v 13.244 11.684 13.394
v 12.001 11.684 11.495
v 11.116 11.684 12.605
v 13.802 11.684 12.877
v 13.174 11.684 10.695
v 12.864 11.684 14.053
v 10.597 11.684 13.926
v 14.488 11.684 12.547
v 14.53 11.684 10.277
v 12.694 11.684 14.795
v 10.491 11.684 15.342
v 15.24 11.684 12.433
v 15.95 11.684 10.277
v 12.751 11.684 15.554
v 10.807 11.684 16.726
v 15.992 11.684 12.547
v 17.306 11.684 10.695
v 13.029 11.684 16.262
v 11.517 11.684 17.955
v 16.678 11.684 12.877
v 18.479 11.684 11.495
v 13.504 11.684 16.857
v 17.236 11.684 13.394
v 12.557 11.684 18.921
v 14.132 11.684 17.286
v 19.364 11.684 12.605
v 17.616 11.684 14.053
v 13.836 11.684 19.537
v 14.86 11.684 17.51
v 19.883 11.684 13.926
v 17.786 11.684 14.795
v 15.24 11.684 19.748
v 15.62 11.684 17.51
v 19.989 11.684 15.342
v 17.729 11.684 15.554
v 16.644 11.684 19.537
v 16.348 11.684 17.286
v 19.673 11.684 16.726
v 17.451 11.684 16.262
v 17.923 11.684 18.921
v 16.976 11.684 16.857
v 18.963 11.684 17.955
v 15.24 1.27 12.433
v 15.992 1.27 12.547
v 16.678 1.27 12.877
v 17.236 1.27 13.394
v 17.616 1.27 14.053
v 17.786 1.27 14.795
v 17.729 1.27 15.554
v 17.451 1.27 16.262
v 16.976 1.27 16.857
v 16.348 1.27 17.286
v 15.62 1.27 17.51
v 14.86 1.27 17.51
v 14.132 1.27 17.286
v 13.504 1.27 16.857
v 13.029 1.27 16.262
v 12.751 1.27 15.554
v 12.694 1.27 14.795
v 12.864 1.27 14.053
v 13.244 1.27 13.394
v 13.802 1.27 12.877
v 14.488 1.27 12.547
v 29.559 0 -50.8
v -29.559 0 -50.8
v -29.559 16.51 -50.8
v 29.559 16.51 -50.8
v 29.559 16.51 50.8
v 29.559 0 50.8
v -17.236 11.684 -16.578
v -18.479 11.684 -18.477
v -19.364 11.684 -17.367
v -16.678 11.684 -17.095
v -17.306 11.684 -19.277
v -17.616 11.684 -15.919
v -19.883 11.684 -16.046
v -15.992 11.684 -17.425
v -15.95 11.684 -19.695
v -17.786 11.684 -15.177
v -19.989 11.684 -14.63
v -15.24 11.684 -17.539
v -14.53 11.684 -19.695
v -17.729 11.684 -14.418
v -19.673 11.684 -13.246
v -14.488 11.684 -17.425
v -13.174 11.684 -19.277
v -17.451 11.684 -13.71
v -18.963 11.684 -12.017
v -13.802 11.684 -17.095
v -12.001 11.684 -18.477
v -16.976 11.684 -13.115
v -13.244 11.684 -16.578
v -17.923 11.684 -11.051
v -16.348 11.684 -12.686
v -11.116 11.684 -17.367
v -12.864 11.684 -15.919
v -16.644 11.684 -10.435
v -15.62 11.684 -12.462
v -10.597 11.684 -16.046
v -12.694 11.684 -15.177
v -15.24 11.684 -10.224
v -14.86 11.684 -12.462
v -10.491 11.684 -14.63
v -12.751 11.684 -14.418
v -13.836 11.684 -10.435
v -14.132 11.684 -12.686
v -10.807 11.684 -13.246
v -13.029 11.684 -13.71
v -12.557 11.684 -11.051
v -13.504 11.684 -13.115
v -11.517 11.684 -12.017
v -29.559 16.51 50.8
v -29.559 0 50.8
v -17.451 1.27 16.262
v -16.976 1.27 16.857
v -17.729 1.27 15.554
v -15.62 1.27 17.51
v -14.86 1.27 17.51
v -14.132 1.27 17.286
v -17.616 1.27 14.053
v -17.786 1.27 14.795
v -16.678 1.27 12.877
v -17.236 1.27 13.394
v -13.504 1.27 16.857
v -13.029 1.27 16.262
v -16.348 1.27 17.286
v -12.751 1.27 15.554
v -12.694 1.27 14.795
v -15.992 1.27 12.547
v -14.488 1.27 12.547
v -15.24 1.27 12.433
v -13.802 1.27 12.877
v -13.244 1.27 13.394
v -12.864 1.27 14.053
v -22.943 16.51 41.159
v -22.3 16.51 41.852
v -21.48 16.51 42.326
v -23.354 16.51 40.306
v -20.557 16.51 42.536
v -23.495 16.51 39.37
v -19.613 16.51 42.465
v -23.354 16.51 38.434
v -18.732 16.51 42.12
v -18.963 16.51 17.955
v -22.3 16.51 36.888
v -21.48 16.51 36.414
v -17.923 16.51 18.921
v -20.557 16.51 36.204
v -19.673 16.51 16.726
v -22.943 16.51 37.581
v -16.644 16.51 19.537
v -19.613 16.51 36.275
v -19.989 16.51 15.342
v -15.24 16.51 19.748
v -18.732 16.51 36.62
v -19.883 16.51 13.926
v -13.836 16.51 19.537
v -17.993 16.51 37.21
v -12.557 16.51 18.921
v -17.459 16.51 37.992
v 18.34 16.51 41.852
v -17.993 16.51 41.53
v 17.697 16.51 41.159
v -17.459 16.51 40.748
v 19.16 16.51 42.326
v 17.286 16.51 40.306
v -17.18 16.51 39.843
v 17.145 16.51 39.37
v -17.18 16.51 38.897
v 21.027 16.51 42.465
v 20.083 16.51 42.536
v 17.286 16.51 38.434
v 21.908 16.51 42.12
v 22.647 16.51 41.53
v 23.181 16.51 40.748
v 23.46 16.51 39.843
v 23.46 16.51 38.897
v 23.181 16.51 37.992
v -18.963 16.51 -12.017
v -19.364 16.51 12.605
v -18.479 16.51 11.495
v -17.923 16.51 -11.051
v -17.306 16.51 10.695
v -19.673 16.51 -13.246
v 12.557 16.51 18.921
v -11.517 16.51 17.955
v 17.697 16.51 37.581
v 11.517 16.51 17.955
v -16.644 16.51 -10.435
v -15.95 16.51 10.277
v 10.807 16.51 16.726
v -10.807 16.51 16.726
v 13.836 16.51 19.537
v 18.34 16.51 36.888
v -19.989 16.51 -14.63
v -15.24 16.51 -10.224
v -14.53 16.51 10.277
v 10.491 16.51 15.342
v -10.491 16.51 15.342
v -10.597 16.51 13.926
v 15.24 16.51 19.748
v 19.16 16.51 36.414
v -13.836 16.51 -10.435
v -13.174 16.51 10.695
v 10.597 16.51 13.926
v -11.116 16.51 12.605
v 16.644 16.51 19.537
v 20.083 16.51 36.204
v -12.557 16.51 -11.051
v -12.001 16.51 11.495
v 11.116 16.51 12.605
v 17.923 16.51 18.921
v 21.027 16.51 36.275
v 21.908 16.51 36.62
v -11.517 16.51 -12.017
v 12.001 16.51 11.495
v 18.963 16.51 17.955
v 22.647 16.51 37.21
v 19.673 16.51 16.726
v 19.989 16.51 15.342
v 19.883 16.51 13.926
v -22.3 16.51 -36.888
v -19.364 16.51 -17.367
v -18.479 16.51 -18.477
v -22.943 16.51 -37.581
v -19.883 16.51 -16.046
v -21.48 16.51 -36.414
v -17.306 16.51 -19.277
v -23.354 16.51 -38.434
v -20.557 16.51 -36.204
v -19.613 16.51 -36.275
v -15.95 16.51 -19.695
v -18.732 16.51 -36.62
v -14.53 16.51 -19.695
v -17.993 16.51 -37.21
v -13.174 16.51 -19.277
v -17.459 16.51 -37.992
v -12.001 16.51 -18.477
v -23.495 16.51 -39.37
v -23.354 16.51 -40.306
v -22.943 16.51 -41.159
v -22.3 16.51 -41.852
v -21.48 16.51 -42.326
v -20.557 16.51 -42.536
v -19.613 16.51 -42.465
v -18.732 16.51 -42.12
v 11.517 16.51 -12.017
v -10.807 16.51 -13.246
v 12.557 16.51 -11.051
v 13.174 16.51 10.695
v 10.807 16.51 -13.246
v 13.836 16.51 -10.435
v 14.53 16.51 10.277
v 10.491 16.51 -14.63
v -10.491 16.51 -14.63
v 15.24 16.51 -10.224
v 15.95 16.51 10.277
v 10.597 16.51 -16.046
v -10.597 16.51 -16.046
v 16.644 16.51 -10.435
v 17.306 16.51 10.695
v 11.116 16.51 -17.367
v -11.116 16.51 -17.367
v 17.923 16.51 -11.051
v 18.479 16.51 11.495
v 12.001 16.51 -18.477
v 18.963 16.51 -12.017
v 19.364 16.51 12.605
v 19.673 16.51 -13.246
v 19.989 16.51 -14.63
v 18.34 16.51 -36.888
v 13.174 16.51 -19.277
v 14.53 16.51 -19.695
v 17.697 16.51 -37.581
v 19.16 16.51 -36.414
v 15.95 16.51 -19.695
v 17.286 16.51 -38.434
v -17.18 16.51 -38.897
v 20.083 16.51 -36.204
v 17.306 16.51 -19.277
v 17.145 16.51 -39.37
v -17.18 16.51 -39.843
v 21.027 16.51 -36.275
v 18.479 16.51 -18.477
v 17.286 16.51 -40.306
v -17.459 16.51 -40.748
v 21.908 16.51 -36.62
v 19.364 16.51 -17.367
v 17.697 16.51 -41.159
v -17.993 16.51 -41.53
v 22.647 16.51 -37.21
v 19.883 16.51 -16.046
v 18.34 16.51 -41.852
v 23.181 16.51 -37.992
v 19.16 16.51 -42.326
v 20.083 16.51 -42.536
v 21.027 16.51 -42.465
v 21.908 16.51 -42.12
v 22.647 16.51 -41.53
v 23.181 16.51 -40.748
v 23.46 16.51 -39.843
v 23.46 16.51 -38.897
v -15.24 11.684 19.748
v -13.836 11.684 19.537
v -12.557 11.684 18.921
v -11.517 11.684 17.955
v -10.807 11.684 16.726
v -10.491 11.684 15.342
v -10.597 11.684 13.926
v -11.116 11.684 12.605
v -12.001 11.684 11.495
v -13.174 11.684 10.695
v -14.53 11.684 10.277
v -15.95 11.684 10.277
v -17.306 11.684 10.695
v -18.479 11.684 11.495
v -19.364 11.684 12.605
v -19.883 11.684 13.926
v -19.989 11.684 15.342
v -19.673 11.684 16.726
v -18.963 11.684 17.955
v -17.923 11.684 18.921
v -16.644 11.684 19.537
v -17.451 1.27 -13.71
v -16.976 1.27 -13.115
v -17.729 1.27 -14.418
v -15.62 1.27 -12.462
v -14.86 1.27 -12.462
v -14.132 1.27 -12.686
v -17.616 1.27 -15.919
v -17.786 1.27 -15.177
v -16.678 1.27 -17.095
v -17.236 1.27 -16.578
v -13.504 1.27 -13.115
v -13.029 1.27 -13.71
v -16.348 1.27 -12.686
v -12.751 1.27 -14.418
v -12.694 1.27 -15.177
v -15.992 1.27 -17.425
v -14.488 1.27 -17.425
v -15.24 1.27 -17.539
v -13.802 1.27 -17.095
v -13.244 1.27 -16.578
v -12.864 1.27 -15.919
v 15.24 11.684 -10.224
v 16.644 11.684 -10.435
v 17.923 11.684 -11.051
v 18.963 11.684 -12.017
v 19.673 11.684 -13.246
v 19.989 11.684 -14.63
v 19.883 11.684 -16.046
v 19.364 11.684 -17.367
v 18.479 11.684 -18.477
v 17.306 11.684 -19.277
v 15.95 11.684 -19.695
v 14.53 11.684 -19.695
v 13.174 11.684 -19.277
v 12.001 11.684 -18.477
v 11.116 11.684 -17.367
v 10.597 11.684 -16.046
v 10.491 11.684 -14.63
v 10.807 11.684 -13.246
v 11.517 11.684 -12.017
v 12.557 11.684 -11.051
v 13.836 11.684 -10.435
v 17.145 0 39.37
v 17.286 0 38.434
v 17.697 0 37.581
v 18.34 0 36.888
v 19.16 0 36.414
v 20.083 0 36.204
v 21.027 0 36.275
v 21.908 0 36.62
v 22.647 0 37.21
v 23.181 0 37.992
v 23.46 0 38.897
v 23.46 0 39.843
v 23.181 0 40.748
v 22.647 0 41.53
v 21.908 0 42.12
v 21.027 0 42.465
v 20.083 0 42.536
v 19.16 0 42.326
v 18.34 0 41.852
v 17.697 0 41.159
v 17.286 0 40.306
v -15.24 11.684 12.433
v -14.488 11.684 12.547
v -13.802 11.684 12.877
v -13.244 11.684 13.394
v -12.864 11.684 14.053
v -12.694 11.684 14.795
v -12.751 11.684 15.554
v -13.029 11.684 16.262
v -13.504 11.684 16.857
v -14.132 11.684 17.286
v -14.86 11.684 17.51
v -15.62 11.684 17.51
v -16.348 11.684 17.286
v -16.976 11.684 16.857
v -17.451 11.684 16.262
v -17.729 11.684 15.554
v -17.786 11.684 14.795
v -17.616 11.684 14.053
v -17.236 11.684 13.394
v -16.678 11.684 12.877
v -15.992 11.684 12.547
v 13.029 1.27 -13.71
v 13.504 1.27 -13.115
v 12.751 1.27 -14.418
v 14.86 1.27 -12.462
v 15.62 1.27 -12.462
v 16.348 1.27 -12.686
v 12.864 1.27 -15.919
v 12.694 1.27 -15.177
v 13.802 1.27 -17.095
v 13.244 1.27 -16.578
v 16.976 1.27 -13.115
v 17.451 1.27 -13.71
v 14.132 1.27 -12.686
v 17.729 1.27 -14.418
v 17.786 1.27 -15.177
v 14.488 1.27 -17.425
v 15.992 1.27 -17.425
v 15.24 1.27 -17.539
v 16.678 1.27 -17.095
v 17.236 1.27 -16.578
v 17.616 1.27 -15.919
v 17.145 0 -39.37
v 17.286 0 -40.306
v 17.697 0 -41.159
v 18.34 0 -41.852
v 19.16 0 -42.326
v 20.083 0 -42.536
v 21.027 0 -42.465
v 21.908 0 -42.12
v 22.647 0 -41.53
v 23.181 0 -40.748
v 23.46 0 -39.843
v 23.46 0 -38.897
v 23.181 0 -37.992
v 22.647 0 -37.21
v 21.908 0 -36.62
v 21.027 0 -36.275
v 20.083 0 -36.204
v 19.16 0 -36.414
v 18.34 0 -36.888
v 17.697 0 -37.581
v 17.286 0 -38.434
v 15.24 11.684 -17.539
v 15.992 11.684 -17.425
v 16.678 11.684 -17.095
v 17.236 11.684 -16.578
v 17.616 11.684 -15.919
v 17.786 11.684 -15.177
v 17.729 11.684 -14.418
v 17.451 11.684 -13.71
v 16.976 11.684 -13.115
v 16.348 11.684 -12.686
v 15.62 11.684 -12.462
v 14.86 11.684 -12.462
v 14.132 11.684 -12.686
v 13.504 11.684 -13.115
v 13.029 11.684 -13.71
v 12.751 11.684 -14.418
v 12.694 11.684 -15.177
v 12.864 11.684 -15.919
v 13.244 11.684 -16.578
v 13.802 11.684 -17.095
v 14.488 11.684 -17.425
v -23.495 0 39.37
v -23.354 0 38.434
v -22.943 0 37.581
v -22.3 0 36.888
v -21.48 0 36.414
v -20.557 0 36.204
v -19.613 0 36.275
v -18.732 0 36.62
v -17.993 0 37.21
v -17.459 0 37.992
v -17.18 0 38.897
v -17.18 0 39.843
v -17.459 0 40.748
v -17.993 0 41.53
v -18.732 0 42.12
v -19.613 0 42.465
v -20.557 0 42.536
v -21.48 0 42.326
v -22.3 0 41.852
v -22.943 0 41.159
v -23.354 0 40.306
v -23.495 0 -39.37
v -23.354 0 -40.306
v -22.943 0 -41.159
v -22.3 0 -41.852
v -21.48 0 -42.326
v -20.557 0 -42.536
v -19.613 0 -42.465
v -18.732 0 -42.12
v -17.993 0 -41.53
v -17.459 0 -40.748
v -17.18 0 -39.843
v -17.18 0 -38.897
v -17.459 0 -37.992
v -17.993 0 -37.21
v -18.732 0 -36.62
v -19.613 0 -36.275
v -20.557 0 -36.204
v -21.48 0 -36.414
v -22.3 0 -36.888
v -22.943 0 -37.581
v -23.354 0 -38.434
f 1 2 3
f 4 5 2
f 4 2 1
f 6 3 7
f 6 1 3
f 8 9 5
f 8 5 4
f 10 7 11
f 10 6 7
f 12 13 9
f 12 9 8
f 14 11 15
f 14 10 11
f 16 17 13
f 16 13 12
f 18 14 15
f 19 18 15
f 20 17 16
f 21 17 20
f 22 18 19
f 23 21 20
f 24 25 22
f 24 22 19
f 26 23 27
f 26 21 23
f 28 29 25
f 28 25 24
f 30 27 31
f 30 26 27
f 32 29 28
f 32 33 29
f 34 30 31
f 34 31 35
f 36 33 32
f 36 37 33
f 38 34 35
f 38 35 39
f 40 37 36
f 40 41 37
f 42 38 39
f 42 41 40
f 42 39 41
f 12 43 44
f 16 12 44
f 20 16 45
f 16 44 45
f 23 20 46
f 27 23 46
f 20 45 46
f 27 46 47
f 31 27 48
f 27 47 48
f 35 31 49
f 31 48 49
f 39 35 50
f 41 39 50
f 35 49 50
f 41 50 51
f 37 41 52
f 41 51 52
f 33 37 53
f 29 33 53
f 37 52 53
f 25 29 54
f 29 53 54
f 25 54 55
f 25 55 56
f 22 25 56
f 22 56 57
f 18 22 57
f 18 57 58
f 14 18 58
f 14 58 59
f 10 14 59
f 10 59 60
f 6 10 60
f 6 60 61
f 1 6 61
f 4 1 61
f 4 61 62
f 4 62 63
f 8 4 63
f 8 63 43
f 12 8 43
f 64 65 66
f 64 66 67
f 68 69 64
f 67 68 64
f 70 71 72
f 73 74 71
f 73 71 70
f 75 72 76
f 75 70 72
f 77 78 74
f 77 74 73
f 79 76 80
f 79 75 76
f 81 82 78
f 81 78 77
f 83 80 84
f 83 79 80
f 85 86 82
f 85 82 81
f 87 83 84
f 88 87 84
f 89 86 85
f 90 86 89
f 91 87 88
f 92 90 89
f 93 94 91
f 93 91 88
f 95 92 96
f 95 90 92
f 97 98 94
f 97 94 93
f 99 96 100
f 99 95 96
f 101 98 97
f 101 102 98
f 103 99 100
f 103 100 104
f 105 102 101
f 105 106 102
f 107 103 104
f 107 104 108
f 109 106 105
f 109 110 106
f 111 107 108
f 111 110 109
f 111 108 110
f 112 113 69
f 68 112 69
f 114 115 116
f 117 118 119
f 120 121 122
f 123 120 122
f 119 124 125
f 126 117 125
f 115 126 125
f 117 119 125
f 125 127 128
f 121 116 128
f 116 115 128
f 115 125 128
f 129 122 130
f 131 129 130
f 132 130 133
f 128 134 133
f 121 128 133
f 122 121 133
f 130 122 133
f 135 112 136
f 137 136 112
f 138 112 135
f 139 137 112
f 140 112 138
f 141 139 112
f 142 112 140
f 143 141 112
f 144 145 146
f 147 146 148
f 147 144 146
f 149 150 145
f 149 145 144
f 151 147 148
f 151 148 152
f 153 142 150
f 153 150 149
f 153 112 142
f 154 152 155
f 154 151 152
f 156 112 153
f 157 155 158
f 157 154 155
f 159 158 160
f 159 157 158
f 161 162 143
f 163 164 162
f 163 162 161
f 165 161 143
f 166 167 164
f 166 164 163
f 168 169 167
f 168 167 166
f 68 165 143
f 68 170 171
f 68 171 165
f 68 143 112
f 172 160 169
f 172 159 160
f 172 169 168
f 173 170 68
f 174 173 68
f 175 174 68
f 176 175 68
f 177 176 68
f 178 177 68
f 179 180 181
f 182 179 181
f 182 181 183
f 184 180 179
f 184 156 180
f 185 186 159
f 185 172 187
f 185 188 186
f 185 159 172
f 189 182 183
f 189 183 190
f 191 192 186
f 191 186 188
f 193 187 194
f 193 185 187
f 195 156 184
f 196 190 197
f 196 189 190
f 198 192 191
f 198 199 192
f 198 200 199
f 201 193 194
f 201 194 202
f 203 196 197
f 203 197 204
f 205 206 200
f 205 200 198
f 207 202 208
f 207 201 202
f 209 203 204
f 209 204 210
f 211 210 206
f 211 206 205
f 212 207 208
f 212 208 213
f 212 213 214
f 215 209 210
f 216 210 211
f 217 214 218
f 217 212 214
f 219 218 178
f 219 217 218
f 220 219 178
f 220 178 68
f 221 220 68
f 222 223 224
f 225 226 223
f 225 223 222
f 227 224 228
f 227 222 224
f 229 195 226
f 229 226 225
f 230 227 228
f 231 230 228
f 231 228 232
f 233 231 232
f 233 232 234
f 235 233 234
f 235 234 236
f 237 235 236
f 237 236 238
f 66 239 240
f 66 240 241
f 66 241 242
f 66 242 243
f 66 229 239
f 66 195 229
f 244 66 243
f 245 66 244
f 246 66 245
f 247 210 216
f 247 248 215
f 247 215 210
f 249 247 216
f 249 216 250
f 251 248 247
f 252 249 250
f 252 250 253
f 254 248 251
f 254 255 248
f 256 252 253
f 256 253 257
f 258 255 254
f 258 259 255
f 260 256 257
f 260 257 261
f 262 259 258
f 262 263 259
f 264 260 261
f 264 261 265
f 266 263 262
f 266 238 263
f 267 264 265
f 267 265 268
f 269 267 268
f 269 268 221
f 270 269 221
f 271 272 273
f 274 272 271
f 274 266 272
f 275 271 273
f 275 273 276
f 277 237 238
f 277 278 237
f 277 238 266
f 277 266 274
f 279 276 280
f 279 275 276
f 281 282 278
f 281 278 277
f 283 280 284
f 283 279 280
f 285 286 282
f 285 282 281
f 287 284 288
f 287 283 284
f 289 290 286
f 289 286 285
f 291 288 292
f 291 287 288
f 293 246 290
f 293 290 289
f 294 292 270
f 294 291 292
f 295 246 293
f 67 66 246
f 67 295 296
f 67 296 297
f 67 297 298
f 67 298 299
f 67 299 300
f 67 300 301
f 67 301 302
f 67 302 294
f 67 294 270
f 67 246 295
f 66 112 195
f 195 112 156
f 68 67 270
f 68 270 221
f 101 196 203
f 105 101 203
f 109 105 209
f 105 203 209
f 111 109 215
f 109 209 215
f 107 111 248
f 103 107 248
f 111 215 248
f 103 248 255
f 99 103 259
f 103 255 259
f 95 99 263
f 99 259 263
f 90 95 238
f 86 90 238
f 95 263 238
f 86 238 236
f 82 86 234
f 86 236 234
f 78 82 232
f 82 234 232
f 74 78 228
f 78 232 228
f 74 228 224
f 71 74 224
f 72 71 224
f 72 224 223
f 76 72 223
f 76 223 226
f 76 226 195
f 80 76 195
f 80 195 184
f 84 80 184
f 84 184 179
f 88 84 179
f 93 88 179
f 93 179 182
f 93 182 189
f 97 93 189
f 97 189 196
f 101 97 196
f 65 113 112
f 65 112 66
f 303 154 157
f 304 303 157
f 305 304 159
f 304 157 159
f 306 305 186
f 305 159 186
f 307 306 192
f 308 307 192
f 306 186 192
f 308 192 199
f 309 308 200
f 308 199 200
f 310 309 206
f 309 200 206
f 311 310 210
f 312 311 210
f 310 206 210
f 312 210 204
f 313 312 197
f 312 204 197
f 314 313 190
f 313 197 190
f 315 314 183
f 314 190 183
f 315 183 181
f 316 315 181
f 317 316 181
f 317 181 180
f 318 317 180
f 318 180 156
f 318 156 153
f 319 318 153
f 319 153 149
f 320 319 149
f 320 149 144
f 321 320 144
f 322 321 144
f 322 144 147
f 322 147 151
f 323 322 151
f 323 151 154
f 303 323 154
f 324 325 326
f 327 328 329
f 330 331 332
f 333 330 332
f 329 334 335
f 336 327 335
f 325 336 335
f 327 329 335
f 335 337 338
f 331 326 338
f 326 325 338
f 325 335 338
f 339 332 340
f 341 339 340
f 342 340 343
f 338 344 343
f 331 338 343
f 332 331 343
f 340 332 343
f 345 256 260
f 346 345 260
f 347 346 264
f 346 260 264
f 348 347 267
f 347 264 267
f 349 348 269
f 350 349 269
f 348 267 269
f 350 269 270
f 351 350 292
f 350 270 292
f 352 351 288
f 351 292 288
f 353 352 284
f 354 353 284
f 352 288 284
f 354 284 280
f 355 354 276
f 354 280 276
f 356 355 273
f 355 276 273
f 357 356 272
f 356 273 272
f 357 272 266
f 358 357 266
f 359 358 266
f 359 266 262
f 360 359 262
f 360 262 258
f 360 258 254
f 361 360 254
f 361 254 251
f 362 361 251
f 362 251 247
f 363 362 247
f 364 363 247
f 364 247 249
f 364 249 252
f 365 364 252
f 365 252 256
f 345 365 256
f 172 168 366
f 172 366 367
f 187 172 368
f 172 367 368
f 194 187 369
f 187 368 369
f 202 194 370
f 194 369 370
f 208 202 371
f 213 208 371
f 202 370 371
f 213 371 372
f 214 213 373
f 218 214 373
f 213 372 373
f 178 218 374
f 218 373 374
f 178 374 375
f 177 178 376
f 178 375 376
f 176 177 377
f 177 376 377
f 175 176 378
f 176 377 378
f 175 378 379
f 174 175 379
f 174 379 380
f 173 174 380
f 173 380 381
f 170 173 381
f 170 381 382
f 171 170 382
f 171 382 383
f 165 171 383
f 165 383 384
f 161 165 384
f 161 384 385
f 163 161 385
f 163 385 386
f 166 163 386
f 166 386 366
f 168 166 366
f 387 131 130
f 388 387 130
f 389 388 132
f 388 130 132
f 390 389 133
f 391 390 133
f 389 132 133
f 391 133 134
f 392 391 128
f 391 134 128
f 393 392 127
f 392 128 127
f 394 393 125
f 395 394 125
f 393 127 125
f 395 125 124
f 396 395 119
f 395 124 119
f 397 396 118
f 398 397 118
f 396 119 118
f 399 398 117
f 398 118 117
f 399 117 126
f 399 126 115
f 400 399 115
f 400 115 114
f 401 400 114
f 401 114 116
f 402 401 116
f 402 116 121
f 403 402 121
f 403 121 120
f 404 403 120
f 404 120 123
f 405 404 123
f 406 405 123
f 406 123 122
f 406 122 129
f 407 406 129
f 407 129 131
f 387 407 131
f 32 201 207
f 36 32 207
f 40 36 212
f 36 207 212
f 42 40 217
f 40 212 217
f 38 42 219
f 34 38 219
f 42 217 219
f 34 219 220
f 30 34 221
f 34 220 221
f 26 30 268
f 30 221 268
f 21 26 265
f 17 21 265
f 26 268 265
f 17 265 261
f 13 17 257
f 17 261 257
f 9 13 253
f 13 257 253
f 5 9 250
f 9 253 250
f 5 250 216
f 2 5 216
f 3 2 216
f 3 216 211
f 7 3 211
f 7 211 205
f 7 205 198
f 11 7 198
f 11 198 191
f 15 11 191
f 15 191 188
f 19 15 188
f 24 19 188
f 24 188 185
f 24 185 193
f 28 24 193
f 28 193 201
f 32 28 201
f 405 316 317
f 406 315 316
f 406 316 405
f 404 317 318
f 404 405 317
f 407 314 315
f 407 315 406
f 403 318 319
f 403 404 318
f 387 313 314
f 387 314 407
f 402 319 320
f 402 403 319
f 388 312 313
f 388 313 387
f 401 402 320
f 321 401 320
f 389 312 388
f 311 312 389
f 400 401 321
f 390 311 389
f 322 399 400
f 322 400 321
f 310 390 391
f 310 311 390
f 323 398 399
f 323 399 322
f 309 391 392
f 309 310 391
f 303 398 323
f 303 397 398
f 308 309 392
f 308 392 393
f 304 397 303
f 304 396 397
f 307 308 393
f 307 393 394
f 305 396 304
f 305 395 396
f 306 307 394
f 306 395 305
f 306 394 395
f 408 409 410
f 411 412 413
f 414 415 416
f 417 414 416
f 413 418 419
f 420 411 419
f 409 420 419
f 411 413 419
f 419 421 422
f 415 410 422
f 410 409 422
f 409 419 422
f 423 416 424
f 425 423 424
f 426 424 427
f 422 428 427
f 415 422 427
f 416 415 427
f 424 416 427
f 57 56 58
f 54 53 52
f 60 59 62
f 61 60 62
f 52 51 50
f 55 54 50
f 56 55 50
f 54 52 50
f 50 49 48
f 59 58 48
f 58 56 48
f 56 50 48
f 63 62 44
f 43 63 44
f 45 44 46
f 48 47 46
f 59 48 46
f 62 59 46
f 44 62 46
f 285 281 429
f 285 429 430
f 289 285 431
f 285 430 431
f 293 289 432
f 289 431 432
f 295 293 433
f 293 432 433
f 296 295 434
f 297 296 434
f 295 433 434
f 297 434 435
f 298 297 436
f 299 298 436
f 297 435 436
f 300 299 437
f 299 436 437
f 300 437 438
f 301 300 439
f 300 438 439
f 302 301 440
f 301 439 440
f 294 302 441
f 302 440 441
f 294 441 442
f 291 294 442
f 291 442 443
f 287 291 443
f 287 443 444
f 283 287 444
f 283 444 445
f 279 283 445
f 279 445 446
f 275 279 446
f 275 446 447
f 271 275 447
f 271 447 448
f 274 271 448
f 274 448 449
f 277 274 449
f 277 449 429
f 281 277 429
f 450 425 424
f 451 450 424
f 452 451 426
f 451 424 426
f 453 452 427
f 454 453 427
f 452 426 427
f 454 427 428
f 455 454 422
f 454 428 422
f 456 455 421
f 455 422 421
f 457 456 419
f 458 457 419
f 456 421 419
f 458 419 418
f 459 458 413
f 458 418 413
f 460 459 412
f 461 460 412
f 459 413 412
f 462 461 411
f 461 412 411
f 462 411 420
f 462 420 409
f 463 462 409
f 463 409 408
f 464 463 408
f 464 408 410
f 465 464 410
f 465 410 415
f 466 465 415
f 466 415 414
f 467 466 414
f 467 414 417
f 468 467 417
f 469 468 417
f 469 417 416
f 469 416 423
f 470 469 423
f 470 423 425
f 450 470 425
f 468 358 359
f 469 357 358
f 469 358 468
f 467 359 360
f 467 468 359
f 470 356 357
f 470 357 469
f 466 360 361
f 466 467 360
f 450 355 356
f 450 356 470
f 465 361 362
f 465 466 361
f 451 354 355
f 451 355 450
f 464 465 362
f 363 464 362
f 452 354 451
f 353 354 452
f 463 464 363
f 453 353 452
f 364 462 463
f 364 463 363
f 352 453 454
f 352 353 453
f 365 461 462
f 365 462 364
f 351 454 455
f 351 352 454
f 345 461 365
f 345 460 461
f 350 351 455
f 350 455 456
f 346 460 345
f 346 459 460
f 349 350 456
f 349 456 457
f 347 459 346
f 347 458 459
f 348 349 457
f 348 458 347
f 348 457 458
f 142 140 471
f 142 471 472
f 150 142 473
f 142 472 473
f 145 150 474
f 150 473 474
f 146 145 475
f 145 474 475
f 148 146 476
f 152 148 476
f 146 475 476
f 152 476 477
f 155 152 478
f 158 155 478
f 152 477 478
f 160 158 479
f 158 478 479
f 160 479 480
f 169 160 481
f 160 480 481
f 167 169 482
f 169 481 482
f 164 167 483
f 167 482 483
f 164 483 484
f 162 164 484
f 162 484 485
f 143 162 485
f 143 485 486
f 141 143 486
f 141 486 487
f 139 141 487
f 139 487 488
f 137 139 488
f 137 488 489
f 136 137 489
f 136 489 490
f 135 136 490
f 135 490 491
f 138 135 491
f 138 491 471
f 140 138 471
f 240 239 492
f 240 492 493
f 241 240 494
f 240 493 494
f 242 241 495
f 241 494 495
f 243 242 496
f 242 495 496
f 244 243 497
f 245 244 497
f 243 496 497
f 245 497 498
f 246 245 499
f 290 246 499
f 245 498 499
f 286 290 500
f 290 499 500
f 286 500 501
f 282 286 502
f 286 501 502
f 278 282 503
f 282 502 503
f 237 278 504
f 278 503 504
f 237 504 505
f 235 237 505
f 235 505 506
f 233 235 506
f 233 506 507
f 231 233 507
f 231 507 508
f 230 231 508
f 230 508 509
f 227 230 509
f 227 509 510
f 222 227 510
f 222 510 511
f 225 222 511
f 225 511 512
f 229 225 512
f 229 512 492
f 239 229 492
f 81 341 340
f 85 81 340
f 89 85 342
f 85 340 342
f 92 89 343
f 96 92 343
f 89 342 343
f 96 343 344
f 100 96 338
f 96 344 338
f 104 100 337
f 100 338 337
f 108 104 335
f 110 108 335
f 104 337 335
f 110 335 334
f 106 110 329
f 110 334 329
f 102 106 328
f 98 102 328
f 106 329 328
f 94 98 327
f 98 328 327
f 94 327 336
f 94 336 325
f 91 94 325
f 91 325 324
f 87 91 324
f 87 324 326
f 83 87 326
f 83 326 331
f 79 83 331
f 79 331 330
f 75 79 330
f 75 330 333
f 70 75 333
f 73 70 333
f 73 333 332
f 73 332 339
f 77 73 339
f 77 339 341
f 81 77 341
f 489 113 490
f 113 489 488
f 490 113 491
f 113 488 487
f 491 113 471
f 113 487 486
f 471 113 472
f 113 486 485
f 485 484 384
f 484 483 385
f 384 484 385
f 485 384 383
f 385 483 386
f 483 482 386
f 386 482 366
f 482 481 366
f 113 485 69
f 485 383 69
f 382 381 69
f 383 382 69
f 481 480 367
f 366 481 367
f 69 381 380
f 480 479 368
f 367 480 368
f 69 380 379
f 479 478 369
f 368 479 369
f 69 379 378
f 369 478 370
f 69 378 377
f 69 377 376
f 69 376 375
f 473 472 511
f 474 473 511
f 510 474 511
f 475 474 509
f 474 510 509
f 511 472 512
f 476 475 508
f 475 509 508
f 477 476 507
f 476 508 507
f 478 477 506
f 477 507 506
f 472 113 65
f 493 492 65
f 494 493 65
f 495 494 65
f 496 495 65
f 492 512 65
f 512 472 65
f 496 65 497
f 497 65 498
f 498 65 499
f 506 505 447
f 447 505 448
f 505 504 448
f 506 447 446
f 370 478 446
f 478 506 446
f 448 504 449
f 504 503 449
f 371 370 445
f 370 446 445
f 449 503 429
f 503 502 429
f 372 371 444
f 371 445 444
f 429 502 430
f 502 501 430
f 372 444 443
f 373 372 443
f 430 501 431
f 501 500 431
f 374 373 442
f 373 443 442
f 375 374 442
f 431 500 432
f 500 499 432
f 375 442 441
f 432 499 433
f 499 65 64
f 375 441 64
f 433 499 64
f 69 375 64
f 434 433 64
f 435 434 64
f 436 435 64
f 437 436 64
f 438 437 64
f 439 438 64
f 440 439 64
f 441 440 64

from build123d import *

# Parameters (mm, degrees)
SKETCH1_W                                       = 59.1185
SKETCH1_H                                       = 101.6
BOSS_EXTRUDE1_DEPTH                             = 16.51
CBORE_FOR_10_SOCKET_HEAD_CAP_SCREW1_D           = 5.1054
CBORE_FOR_10_SOCKET_HEAD_CAP_SCREW1_DEPTH       = 15.24
CBORE_FOR_10_SOCKET_HEAD_CAP_SCREW1_CBORE_D     = 9.525
CBORE_FOR_10_SOCKET_HEAD_CAP_SCREW1_CBORE_DEPTH = 4.826
F_1_4_0_25_DIAMETER_HOLE1_D                     = 6.35


with BuildPart() as part:
    # Sketch1 → Boss-Extrude1 (new body)
    with BuildSketch(Plane(origin=(0, 0, 0), x_dir=(1, 0, 0), z_dir=(0, 1, 0))):
        Rectangle(SKETCH1_W, SKETCH1_H)
    extrude(amount=BOSS_EXTRUDE1_DEPTH)

    # CBORE for #10 Socket Head Cap Screw1
    with Locations(Plane(origin=(-223.3968133, 16.51, 0), x_dir=(0, 0, 1), z_dir=(0, 1, 0))):
        with Locations((-14.986, 208.1568133), (14.986, 208.1568133), (14.986, 238.6368133), (-14.986, 238.6368133)):
            CounterBoreHole(CBORE_FOR_10_SOCKET_HEAD_CAP_SCREW1_D / 2, CBORE_FOR_10_SOCKET_HEAD_CAP_SCREW1_CBORE_D / 2, CBORE_FOR_10_SOCKET_HEAD_CAP_SCREW1_CBORE_DEPTH, depth=CBORE_FOR_10_SOCKET_HEAD_CAP_SCREW1_DEPTH)

    # 1/4 (0.25) Diameter Hole1 (through all)
    with Locations(Plane(origin=(0, 16.51, 0), x_dir=(1, 0, 0), z_dir=(0, 1, 0))):
        with Locations((20.32, -39.37), (-20.32, -39.37), (-20.32, 39.37), (20.32, 39.37)):
            Hole(F_1_4_0_25_DIAMETER_HOLE1_D / 2)


solid = part.part
